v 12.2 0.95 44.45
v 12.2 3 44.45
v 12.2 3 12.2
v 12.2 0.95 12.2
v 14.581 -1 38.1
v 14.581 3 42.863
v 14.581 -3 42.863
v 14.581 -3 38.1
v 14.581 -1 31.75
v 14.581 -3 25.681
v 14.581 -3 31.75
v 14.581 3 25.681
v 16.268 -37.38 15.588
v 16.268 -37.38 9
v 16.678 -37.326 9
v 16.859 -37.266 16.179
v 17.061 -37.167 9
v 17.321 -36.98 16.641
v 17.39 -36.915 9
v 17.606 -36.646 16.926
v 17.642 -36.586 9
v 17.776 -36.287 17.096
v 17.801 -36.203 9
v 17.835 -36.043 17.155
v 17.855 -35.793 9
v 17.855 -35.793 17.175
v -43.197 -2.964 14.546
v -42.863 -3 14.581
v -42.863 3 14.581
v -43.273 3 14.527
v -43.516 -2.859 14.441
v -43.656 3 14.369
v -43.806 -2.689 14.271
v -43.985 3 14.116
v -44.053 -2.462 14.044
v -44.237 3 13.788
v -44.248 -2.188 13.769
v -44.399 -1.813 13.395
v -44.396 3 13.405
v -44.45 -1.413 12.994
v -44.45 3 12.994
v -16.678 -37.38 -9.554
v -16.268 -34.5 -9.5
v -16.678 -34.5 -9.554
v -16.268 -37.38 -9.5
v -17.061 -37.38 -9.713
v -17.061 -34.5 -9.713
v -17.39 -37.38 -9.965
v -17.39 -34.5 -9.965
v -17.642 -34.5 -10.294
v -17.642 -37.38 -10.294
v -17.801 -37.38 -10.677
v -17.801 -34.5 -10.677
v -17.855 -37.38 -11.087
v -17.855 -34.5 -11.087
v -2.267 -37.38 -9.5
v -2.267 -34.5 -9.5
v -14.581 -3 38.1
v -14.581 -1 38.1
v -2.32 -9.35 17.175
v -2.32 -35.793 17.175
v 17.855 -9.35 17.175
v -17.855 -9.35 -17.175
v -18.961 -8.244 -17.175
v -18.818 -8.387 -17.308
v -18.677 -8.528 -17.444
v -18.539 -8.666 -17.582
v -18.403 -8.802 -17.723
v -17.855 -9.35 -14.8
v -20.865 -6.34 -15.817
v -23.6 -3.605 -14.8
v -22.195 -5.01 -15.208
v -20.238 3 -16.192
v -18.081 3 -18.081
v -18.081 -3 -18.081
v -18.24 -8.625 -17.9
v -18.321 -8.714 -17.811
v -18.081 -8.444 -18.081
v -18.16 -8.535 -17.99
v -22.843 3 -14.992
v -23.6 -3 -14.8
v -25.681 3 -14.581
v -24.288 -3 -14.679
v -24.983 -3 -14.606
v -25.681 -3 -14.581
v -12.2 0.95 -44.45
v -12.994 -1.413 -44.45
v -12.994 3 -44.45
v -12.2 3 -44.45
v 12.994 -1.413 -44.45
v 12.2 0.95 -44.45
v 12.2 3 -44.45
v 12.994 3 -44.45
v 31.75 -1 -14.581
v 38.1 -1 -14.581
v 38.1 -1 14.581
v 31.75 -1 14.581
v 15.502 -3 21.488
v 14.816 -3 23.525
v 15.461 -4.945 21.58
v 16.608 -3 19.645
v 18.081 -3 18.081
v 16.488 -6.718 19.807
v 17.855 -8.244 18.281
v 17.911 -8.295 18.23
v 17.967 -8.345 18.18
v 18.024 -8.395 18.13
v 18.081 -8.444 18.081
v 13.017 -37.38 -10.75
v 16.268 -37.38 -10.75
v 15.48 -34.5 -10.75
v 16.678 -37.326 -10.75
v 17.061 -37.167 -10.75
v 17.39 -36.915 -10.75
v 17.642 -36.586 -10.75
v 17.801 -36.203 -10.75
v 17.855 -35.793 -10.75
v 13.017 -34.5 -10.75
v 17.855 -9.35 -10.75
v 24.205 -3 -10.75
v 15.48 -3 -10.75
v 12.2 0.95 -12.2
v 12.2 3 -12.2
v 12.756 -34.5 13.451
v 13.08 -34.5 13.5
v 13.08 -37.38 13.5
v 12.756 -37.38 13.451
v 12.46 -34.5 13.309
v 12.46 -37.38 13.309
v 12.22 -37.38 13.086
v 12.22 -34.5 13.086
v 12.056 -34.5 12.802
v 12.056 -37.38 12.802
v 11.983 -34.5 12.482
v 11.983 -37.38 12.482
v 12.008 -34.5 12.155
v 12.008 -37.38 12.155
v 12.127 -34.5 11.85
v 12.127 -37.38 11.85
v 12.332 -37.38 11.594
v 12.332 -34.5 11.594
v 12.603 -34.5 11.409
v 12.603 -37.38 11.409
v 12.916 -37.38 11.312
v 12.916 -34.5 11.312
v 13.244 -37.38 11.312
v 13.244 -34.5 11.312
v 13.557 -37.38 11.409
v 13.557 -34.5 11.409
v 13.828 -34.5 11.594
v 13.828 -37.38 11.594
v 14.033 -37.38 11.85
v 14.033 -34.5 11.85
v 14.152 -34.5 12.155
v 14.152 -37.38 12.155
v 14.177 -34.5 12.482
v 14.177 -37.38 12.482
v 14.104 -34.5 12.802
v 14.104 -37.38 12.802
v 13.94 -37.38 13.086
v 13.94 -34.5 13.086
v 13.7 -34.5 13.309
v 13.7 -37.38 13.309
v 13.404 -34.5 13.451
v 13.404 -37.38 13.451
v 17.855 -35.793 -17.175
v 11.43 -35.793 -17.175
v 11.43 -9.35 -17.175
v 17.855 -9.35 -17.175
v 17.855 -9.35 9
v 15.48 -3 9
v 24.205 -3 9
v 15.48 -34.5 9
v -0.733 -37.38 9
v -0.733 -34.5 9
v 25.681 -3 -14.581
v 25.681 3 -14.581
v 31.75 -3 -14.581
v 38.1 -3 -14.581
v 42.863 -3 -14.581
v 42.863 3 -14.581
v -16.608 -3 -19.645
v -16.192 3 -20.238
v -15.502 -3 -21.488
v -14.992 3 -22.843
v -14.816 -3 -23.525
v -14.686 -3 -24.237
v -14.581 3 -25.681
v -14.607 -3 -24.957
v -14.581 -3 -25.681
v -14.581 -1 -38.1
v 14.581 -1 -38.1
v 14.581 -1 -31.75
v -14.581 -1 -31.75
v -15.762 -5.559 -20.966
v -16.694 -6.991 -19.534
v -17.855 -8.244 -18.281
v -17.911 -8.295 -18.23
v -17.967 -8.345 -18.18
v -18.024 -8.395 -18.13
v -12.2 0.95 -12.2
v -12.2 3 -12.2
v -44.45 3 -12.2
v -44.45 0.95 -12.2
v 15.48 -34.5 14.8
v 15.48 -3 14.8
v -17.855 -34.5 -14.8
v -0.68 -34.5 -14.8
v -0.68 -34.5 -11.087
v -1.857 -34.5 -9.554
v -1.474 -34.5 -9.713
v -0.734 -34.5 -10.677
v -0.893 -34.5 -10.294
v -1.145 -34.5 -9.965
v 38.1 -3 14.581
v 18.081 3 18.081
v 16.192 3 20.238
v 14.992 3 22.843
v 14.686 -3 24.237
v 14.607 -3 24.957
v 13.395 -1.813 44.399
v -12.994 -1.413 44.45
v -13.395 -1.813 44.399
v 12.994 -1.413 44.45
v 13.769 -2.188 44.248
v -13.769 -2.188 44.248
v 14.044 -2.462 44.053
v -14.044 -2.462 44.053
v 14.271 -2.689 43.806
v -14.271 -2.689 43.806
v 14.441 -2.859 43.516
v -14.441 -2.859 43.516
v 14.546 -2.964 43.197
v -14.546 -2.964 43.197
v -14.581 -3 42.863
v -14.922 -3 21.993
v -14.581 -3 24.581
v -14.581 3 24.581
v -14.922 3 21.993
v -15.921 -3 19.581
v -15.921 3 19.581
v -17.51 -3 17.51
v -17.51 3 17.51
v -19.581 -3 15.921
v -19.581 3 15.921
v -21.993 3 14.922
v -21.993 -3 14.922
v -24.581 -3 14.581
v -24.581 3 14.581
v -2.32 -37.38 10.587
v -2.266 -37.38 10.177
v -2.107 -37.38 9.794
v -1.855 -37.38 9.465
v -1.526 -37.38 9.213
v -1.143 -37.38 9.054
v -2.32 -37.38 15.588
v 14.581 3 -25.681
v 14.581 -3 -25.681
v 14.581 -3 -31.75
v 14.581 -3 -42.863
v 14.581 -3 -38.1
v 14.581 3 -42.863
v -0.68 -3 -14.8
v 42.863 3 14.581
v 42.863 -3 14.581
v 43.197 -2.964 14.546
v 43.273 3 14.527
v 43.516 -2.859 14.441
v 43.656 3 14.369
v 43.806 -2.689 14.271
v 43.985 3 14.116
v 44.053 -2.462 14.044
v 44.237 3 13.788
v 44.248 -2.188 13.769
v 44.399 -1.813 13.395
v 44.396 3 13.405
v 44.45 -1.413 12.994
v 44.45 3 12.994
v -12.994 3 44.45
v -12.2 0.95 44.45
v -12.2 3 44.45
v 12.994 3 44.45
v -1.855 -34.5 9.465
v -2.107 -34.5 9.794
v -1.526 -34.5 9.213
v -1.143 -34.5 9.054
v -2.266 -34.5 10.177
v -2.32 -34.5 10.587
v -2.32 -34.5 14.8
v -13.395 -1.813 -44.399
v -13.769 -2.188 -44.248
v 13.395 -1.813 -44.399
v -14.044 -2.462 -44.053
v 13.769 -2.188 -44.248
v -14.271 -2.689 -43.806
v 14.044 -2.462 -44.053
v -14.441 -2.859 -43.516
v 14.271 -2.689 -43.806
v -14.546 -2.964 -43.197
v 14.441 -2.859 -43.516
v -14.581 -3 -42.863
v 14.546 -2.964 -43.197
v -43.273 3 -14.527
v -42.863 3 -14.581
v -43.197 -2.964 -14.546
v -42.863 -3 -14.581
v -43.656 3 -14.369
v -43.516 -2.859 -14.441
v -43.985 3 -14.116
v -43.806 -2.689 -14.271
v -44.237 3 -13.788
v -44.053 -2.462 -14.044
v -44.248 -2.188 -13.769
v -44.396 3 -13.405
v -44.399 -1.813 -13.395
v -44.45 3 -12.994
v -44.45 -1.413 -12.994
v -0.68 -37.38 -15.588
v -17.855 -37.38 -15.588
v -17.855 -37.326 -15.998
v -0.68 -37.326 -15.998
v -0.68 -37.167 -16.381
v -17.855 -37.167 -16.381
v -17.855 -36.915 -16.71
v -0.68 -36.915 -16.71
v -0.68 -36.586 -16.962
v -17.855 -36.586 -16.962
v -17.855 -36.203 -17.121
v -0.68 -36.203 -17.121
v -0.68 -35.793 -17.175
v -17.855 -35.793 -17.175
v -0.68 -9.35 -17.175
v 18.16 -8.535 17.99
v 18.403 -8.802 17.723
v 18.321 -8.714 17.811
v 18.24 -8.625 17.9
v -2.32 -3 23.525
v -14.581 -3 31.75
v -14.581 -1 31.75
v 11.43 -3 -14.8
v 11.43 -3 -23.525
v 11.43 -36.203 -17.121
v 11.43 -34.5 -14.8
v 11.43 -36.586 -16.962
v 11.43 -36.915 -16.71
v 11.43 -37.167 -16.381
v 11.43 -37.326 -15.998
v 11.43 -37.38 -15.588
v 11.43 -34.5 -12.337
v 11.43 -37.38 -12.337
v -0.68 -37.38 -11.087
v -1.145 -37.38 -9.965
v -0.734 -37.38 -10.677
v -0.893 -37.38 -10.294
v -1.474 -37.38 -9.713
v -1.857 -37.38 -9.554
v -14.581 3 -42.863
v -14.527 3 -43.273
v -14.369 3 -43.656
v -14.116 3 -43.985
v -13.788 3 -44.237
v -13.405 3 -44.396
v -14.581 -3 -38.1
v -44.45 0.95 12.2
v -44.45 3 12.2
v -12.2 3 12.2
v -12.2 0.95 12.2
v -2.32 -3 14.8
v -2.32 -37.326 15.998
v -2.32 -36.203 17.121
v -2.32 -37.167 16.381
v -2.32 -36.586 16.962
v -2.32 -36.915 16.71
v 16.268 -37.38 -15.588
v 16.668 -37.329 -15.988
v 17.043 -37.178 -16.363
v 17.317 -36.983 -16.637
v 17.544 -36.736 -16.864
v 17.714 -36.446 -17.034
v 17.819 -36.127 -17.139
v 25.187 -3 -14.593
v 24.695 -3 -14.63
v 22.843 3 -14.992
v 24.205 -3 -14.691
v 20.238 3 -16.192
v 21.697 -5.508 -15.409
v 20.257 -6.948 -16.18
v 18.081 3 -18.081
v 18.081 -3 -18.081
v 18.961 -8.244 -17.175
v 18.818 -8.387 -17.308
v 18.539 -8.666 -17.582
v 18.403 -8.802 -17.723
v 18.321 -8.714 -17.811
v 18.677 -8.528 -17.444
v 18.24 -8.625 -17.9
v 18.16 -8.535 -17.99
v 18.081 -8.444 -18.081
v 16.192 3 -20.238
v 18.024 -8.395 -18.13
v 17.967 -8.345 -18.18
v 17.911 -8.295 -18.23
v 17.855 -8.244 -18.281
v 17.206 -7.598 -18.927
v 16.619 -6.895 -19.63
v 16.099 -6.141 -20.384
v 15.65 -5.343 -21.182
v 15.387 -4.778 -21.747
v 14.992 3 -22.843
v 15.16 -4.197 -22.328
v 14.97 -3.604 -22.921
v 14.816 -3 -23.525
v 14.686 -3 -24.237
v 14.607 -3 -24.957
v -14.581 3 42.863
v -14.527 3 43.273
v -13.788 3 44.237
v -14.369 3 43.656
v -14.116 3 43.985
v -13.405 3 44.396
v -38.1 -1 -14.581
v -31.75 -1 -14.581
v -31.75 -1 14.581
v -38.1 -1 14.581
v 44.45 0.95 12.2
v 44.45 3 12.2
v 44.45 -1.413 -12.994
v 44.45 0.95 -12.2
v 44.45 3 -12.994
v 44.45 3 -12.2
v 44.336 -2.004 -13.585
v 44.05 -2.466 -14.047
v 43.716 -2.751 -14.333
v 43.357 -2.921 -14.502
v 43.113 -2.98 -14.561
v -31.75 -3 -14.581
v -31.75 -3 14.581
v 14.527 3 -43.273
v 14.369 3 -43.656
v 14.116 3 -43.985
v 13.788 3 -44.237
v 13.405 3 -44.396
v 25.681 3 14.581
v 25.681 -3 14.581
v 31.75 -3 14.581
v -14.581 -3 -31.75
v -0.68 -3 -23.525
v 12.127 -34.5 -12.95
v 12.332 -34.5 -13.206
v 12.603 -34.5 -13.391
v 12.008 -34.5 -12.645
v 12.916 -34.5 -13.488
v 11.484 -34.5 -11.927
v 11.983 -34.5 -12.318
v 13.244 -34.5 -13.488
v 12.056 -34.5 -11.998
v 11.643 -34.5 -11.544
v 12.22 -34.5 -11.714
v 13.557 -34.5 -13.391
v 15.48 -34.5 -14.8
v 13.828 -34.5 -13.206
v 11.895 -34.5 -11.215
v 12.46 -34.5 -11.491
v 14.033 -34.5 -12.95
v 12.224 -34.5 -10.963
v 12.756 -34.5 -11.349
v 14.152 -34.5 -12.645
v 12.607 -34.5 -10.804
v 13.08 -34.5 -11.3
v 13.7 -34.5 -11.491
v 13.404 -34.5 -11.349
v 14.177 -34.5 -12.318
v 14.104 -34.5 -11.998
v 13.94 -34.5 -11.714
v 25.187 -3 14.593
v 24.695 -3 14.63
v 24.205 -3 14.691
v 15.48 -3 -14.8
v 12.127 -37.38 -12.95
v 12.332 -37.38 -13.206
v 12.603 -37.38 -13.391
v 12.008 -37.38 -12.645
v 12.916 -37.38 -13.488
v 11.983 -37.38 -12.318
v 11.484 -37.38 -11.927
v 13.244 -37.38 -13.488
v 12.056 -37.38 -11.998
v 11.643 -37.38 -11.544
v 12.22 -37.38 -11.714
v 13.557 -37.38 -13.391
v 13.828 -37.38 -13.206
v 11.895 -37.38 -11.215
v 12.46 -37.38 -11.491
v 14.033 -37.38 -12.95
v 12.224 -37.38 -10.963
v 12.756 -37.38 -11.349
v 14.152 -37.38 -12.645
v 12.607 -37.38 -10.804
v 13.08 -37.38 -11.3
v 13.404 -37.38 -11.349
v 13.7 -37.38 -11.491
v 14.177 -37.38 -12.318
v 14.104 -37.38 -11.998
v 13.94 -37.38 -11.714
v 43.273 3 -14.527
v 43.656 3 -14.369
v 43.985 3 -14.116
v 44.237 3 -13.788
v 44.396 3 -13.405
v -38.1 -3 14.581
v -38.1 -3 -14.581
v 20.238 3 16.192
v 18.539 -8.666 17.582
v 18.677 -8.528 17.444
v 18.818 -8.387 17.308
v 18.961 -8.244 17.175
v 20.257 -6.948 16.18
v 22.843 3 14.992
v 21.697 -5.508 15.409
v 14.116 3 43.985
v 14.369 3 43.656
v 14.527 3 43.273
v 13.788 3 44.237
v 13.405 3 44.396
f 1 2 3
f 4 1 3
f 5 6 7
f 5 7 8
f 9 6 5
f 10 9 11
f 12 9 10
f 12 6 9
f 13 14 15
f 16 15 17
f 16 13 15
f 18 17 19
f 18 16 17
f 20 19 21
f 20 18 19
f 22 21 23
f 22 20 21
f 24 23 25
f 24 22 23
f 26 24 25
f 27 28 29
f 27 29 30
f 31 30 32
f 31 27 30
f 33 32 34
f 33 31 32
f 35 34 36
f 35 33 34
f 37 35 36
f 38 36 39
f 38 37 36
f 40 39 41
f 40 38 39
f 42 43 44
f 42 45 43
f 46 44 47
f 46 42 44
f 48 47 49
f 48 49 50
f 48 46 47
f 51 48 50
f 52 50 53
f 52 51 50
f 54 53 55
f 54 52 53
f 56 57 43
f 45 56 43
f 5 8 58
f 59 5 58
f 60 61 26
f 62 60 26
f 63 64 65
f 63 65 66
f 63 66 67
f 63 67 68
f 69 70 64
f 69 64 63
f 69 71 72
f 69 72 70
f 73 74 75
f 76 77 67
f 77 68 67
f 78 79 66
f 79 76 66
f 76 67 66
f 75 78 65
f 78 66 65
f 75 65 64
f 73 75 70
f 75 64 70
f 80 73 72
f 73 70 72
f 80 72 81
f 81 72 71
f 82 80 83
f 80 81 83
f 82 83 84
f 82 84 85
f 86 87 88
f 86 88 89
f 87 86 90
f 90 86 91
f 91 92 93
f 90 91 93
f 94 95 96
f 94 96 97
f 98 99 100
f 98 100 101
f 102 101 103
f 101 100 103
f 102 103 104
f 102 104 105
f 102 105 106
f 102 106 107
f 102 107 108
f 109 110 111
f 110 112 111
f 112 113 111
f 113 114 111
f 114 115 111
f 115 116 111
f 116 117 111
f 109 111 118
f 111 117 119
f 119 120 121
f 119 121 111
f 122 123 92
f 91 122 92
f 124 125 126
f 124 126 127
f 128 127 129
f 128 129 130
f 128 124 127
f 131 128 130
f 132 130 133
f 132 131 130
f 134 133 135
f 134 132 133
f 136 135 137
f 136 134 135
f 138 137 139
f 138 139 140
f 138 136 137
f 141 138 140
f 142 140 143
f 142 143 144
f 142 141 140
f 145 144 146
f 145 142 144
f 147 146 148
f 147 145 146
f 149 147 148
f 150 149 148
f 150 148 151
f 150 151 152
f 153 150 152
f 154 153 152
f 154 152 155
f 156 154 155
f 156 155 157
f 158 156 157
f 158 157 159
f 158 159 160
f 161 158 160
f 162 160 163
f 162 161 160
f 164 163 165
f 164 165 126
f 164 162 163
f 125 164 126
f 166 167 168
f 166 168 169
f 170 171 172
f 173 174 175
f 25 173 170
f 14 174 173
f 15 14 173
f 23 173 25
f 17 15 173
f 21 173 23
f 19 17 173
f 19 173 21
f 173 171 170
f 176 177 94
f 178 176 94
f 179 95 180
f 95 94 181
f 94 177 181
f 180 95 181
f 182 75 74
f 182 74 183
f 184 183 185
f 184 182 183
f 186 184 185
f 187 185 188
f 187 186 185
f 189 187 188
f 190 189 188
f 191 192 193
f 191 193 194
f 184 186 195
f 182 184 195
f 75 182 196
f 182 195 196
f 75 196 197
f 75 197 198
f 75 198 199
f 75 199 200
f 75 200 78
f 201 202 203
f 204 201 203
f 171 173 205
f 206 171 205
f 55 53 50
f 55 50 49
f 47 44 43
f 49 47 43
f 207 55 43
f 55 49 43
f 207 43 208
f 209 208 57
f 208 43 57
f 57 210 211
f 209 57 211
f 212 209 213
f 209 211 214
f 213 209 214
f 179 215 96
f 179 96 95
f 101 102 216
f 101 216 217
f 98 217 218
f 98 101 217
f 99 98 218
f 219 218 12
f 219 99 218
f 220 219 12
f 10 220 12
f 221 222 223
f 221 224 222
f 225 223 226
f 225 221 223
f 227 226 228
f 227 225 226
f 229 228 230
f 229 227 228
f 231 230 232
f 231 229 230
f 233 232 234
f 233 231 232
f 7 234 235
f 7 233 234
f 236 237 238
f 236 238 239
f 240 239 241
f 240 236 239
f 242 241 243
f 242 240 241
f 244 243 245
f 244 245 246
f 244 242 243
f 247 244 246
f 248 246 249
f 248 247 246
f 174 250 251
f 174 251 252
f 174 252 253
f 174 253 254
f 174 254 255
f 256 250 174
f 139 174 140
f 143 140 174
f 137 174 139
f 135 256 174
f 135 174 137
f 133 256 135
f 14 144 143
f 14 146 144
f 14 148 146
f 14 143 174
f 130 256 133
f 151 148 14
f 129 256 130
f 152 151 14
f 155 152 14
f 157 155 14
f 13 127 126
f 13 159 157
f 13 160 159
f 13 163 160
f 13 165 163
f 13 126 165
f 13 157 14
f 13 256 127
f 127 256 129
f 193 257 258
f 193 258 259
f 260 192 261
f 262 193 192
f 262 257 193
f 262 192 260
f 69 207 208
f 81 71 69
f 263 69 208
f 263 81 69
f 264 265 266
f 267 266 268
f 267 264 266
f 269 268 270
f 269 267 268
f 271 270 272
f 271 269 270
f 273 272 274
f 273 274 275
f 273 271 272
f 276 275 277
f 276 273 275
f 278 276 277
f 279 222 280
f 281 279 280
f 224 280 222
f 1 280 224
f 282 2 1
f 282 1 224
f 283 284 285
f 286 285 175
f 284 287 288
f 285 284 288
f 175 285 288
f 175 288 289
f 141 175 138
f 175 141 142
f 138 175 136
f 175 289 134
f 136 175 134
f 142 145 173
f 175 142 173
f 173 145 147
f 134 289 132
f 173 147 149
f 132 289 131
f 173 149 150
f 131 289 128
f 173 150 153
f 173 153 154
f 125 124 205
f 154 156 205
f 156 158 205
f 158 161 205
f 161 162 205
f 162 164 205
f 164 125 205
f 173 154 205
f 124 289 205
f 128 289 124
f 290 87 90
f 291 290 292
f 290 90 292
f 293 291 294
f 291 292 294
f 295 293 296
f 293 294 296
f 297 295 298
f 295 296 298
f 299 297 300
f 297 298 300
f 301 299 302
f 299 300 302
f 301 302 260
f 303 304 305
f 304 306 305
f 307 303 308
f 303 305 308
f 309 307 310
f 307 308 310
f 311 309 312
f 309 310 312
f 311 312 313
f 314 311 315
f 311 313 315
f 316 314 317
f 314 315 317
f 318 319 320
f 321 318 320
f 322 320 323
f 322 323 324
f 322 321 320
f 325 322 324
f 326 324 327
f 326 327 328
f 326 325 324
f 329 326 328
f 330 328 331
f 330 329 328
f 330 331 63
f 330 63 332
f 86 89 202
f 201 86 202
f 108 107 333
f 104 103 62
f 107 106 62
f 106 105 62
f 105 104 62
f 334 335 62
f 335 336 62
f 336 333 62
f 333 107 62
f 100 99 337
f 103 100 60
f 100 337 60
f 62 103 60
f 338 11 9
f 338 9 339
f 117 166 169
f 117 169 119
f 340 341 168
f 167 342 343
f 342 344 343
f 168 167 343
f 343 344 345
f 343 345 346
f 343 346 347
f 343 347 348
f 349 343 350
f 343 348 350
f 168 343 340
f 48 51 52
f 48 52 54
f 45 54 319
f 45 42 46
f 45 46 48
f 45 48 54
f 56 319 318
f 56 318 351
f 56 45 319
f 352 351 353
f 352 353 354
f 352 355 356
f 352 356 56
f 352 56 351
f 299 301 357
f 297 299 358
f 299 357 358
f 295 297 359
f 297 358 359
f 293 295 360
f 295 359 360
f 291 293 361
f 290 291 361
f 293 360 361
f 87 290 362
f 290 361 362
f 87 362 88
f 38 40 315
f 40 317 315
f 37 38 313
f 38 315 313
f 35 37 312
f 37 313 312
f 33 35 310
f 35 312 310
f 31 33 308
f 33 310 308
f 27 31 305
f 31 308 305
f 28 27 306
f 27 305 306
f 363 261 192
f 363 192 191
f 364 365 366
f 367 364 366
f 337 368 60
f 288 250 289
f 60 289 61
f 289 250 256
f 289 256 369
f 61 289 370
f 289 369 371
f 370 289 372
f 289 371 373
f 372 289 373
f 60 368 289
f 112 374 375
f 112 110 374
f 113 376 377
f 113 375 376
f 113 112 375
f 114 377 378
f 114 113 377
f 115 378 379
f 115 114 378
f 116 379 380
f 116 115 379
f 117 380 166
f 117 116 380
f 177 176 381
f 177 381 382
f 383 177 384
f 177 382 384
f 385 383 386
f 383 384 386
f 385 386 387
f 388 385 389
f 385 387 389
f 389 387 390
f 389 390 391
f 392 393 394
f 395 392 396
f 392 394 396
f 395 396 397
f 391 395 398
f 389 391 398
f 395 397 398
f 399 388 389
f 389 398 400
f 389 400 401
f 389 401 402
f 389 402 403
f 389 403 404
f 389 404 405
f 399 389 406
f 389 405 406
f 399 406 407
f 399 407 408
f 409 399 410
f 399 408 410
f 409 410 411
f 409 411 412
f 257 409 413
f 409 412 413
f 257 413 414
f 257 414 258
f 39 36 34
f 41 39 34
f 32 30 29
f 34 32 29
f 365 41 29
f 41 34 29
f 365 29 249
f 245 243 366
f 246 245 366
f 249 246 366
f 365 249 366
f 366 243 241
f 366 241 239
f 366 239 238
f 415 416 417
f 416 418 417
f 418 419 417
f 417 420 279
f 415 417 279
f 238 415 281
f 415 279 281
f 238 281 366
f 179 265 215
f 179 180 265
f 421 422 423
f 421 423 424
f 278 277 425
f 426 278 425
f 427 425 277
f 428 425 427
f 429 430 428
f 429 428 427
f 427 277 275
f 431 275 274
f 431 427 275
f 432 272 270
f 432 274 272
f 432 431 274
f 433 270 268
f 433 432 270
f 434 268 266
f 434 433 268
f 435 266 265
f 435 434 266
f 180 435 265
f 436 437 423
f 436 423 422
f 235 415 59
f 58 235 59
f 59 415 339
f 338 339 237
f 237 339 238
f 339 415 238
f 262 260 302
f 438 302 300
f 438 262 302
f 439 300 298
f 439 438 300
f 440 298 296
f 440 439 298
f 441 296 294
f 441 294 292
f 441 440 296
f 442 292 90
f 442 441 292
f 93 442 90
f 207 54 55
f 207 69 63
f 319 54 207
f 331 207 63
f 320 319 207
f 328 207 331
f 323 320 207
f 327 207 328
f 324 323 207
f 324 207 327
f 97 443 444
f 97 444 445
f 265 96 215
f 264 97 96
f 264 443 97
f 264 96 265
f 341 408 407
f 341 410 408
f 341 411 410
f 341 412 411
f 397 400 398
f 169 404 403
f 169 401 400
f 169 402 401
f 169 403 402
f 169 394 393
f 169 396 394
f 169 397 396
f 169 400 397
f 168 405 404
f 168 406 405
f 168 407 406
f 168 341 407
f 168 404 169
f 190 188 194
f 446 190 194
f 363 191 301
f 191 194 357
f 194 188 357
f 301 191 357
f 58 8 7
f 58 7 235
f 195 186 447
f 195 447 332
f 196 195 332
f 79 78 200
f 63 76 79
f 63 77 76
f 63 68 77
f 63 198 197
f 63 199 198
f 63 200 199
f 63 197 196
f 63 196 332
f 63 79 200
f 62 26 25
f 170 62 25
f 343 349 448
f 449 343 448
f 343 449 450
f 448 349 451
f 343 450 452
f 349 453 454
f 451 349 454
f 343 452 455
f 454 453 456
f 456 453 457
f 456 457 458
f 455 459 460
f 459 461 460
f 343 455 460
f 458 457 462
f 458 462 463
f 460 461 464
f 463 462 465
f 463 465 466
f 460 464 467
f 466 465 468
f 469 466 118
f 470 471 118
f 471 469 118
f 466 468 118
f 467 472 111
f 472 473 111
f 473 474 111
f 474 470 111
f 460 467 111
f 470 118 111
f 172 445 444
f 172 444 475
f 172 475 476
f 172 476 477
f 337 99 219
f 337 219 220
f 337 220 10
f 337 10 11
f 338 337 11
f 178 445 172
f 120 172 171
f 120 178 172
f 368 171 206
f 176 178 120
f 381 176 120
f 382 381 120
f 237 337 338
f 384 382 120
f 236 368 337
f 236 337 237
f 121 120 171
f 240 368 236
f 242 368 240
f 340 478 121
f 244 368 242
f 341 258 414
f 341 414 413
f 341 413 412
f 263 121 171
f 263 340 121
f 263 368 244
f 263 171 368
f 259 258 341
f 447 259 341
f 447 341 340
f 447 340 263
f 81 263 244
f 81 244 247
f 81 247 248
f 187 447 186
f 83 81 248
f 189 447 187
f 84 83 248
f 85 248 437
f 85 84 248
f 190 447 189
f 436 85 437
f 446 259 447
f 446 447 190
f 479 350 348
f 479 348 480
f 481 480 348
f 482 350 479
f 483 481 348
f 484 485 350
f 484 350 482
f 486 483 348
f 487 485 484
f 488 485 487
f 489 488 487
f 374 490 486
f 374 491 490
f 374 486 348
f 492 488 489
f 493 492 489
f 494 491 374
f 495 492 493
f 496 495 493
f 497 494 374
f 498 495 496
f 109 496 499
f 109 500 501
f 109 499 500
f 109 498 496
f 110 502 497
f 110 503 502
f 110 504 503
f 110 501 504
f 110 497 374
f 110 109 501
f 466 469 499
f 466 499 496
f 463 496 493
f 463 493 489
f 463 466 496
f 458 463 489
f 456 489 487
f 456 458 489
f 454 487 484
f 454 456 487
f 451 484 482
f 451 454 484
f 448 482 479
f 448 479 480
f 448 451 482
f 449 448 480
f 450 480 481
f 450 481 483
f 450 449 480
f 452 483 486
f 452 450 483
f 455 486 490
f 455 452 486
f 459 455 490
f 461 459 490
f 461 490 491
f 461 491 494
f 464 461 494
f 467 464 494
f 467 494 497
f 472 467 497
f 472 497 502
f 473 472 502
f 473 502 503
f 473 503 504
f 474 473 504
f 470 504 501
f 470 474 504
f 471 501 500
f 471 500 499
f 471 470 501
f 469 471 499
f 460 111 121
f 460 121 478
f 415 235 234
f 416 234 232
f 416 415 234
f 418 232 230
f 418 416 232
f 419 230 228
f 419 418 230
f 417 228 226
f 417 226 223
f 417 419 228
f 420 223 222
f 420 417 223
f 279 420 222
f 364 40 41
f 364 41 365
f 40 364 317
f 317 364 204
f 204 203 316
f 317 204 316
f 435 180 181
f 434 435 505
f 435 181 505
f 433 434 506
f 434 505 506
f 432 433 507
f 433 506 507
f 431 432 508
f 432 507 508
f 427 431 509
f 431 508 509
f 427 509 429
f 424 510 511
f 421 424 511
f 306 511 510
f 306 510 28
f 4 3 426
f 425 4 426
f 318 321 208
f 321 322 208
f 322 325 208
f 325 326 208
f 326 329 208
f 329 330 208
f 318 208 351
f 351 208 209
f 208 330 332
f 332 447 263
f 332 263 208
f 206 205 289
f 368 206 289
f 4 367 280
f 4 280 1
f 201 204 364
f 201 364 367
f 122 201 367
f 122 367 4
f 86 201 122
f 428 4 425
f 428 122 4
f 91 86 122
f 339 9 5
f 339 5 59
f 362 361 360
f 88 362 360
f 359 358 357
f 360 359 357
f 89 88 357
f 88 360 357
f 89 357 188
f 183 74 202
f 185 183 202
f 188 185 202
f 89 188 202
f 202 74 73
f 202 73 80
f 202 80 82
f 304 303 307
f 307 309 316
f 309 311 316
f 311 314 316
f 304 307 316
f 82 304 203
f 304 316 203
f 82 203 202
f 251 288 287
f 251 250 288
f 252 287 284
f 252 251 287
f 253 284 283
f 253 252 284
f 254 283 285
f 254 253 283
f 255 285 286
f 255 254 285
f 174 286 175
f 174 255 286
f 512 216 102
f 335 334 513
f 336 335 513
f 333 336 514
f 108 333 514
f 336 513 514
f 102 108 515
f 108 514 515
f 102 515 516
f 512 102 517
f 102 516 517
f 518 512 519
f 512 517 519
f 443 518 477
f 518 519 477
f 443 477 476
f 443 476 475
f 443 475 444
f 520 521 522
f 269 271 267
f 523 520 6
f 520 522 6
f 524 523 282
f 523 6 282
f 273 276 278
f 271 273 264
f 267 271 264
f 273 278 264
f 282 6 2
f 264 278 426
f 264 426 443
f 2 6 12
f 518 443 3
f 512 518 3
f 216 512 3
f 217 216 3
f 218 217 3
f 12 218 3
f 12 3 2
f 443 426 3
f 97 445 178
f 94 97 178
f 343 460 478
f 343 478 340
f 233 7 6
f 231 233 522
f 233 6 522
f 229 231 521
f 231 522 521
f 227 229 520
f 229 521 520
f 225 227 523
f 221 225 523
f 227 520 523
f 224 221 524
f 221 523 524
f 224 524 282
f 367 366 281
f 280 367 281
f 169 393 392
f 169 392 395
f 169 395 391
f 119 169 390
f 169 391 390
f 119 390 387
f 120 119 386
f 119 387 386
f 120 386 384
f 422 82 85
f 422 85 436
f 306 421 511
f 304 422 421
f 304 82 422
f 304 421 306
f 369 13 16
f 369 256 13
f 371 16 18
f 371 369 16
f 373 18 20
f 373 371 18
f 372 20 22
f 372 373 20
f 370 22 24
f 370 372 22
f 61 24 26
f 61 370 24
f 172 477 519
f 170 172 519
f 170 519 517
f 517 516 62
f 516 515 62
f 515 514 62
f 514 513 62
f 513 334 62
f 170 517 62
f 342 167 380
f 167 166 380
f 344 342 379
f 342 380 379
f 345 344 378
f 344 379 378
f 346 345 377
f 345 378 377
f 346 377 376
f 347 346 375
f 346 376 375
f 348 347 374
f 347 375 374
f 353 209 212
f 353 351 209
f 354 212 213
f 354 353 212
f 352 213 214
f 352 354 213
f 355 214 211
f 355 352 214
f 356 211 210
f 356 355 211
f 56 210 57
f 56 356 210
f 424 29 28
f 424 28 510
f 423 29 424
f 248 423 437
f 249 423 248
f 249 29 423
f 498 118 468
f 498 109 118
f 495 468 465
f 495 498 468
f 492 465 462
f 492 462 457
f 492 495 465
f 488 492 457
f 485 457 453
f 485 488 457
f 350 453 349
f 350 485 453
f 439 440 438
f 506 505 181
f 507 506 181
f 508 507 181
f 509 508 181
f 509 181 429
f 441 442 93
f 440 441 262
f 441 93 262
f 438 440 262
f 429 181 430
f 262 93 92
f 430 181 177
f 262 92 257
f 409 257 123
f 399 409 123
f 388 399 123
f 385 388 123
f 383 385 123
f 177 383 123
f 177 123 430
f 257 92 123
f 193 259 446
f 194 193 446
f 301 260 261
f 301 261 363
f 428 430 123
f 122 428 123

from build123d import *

# Parameters (mm, degrees)
SKETCH1_W           = 29.1625
SKETCH1_H           = 29.86875
SKETCH1_W_2         = 29.86875
SKETCH1_H_2         = 29.1625
BOSS_EXTRUDE1_DEPTH = 3
CUT_EXTRUDE1_DEPTH  = 2.05000004
SKETCH3_W           = 14
SKETCH3_H           = 4.5
SKETCH3_W_2         = 3.25
SKETCH3_H_2         = 3.25
SKETCH3_R           = 1.1
SKETCH3_W_3         = 17
SKETCH3_H_3         = 5
BOSS_EXTRUDE2_DEPTH = 2.88
SKETCH6_W           = 3.500000112
SKETCH6_H           = 3.500000112
BOSS_EXTRUDE3_DEPTH = 6
SKETCH4_W           = 17.175
SKETCH4_H           = 2.375
BOSS_EXTRUDE4_DEPTH = 31.5
FILLET1_R           = 10
CHAMFER1_SIZE       = 6.35
FILLET2_R           = 1.5875
FILLET3_R           = 1.5875
SKETCH7_W           = 29.1625
SKETCH7_H           = 6.35
SKETCH7_W_2         = 6.35
SKETCH7_H_2         = 29.1625
CUT_EXTRUDE2_DEPTH  = 2
FILLET4_R           = 1.5875


with BuildPart() as part:
    # Sketch1 → Boss-Extrude1 (new, symmetric)
    with BuildSketch(Plane(origin=(0, 0, 0), x_dir=(1, 0, 0), z_dir=(0, 1, 0))):
        with Locations((0, -29.515625)):
            Rectangle(SKETCH1_W, SKETCH1_H)
        with Locations((-29.515625, 0)):
            Rectangle(SKETCH1_W_2, SKETCH1_H_2)
        Rectangle(SKETCH1_W, SKETCH1_H_2)
        with Locations((0, 29.515625)):
            Rectangle(SKETCH1_W, SKETCH1_H)
        with Locations((29.515625, 0)):
            Rectangle(SKETCH1_W_2, SKETCH1_H_2)
    extrude(amount=BOSS_EXTRUDE1_DEPTH, both=True)

    # Sketch2 → Cut-Extrude1 (cut)
    with BuildSketch(Plane(origin=(0, 3, 0), x_dir=(1, 0, 0), z_dir=(0, 1, 0))):
        Polygon((12.2, -44.45), (12.2, -12.2), (44.45, -12.2), (44.45, 12.2), (12.2, 12.2), (12.2, 44.45), (-12.2, 44.45), (-12.2, 12.2), (-44.45, 12.2), (-44.45, -12.2), (-12.2, -12.2), (-12.2, -44.45), align=None)
    extrude(amount=-CUT_EXTRUDE1_DEPTH, mode=Mode.SUBTRACT)

    # Sketch6 → Boss-Extrude3 (add)
    with BuildSketch(Plane(origin=(0, -3, 0), x_dir=(-1, 0, 0), z_dir=(0, -1, 0))):
        with Locations((-16.331250056, -16.331250056)):
            Rectangle(SKETCH6_W, SKETCH6_H)
        with Locations((-16.331250056, 16.331250056)):
            Rectangle(SKETCH6_W, SKETCH6_H)
        with Locations((16.331250056, 16.331250056)):
            Rectangle(SKETCH6_W, SKETCH6_H)
    extrude(amount=-BOSS_EXTRUDE3_DEPTH)



with BuildPart() as body_2:
    # Sketch3 → Boss-Extrude2 (new body)
    # profile 1 of 6: a face of its own
    with BuildSketch(Plane.XZ.offset(34.5)):
        Polygon((-17.855, -9.5), (-17.855, -17.175), (-0.68, -17.175), (-0.68, -14), (-14.68, -14), (-14.68, -9.5), align=None)
    # profile 2 of 6: a face of its own
    with BuildSketch(Plane.XZ.offset(34.5)):
        with Locations((-7.68, -11.75)):
            Rectangle(SKETCH3_W, SKETCH3_H)
    # profile 3 of 6: a face of its own
    with BuildSketch(Plane.XZ.offset(34.5)):
        Polygon((14.68, -14), (11.43, -14), (11.43, -17.175), (17.855, -17.175), (17.855, -10.75), (14.68, -10.75), align=None)
    # profile 4 of 6: a face of its own
    with BuildSketch(Plane.XZ.offset(34.5)):
        with Locations((13.055, -12.375)):
            Rectangle(SKETCH3_W_2, SKETCH3_H_2)
        with Locations(Location((13.08, -12.4, 0), (0, 0, 90))):
            Circle(SKETCH3_R, mode=Mode.SUBTRACT)
    # profile 5 of 6: a face of its own
    with BuildSketch(Plane.XZ.offset(34.5)):
        with Locations((6.18, 11.5)):
            Rectangle(SKETCH3_W_3, SKETCH3_H_3)
        with Locations(Location((13.08, 12.4, 0), (0, 0, 90))):
            Circle(SKETCH3_R, mode=Mode.SUBTRACT)
    # profile 6 of 6: a face of its own
    with BuildSketch(Plane.XZ.offset(34.5)):
        Polygon((-2.32, 17.175), (-2.32, 14), (14.68, 14), (14.68, 9), (17.855, 9), (17.855, 17.175), align=None)
    extrude(amount=BOSS_EXTRUDE2_DEPTH)


with BuildPart() as part_1:
    add(part.part)

    add(body_2.part)  # Boss-Extrude4 merges body 2
    # Sketch4 → Boss-Extrude4 (add)
    with BuildSketch(Plane(origin=(0, -34.5, 0), x_dir=(1, 0, 0), z_dir=(0, 1, 0))):
        Polygon((15.48, 10.75), (15.48, 14.8), (11.43, 14.8), (11.43, 17.175), (17.855, 17.175), (17.855, 10.75), align=None)
        Polygon((17.855, -9), (15.48, -9), (15.48, -14.8), (-2.32, -14.8), (-2.32, -17.175), (17.855, -17.175), align=None)
        with Locations((-9.2675, 15.9875)):
            Rectangle(SKETCH4_W, SKETCH4_H)
    extrude(amount=BOSS_EXTRUDE4_DEPTH)

    # Fillet1
    # the kernel refuses this fillet: 10 mm, written as the material it adds along each edge
    with BuildSketch(Plane(origin=(-14.58125, -3, 14.58125), x_dir=(-1, 0, 0), z_dir=(0, 1, 0))) as fillet1_piece_1:
        with BuildLine():
            CenterArc((FILLET1_R, FILLET1_R), FILLET1_R, 180, 90)
            Line((0, FILLET1_R), (-FILLET1_R * 0.02, FILLET1_R))
            Line((-FILLET1_R * 0.02, FILLET1_R), (-FILLET1_R * 0.02, -FILLET1_R * 0.02))
            Line((-FILLET1_R * 0.02, -FILLET1_R * 0.02), (FILLET1_R, -FILLET1_R * 0.02))
            Line((FILLET1_R, -FILLET1_R * 0.02), (FILLET1_R, 0))
        make_face()
    extrude(amount=6)
    with BuildSketch(Plane(origin=(-14.58125, -3, -18.081250112), x_dir=(0, 0, -1), z_dir=(0, 1, 0))) as fillet1_piece_2:
        with BuildLine():
            CenterArc((7.599342173, 10), FILLET1_R, 220.541601029, 49.458398971)
            Line((0, 3.500000112), (-0.151986843, 3.370000114))
            ThreePointArc((-0.151986843, 3.370000114), (-0.2, 1.750000056), (-0.2, 0))
            Line((-0.2, 0), (0, -0.2))
            Line((0, -0.2), (7.599342173, -0.2))
            Line((7.599342173, -0.2), (7.599342173, 0))
        make_face()
    extrude(amount=6)
    with BuildSketch(Plane(origin=(-18.081250112, -3, -14.58125), x_dir=(0, 0, -1), z_dir=(0, 1, 0)), Plane(origin=(14.58125, -3, -18.081250112), x_dir=(1, 0, 0), z_dir=(0, 1, 0))) as fillet1_piece_3:
        with BuildLine():
            CenterArc((10, 7.599342173), FILLET1_R, 180, 49.458398971)
            Line((0, 7.599342173), (-0.2, 7.599342173))
            Line((-0.2, 7.599342173), (-0.2, 0))
            Line((-0.2, 0), (0, -0.2))
            ThreePointArc((0, -0.2), (1.750000056, -0.2), (3.370000114, -0.151986843))
            Line((3.370000114, -0.151986843), (3.500000112, 0))
        make_face()
    extrude(amount=6)
    with BuildSketch(Plane(origin=(18.081250112, -3, -14.58125), x_dir=(0, 0, -1), z_dir=(0, 1, 0)), Plane(origin=(14.58125, -3, 18.081250112), x_dir=(1, 0, 0), z_dir=(0, 1, 0))) as fillet1_piece_4:
        with BuildLine():
            CenterArc((10, -7.599342173), FILLET1_R, 130.541601029, 49.458398971)
            Line((0, -7.599342173), (-0.2, -7.599342173))
            Line((-0.2, -7.599342173), (-0.2, 0))
            Line((-0.2, 0), (0, 0.2))
            ThreePointArc((0, 0.2), (1.750000056, 0.2), (3.370000114, 0.151986843))
            Line((3.370000114, 0.151986843), (3.500000112, 0))
        make_face()
    extrude(amount=6)
    with BuildSketch(Plane(origin=(18.081250112, -3, 14.58125), x_dir=(1, 0, 0), z_dir=(0, 1, 0))) as fillet1_piece_5:
        with BuildLine():
            CenterArc((7.599342173, -10), FILLET1_R, 90, 49.458398971)
            Line((0, -3.500000112), (-0.151986843, -3.370000114))
            ThreePointArc((-0.151986843, -3.370000114), (-0.2, -1.750000056), (-0.2, 0))
            Line((-0.2, 0), (0, 0.2))
            Line((0, 0.2), (7.599342173, 0.2))
            Line((7.599342173, 0.2), (7.599342173, 0))
        make_face()
    extrude(amount=6)

    # Chamfer1
    # the kernel refuses this chamfer: 6.35 mm, written as the material it adds along each edge
    with BuildSketch(Plane(origin=(-2.32, -3, 17.175), x_dir=(0, 0, 1), z_dir=(1, 0, 0))) as chamfer1_piece_1_section:
        Polygon((CHAMFER1_SIZE, 0), (0, CHAMFER1_SIZE), (0, 0), align=None)
    chamfer1_piece_1 = extrude(amount=36.505186974, mode=Mode.PRIVATE)
    chamfer1_piece_1 = chamfer1_piece_1 - Plane(origin=(25.680592285, -3, 24.58125), x_dir=(1, 0, 0), z_dir=(0, -1, 0)) * Cylinder(10, 99, mode=Mode.PRIVATE)
    chamfer1_piece_1 = chamfer1_piece_1 - Plane(origin=(24.58125, -3, 25.680592285), x_dir=(1, 0, 0), z_dir=(0, -1, 0)) * Cylinder(10, 99, mode=Mode.PRIVATE)
    chamfer1_piece_1 = split(chamfer1_piece_1, bisect_by=Plane(origin=(10.9425, -16.2625, 17.175), z_dir=(-0.7071067811865478, 0.7071067811865475, 0)), keep=Keep.TOP, mode=Mode.PRIVATE)
    add(chamfer1_piece_1)
    with BuildSketch(Plane(origin=(17.855, -3, 33.505186974), x_dir=(1, 0, 0), z_dir=(0, 0, -1))) as chamfer1_piece_2_section:
        Polygon((CHAMFER1_SIZE, 0), (0, CHAMFER1_SIZE), (0, 0), align=None)
    chamfer1_piece_2 = extrude(amount=24.505186974, mode=Mode.PRIVATE)
    chamfer1_piece_2 = chamfer1_piece_2 - Plane(origin=(25.680592285, -3, 24.58125), x_dir=(1, 0, 0), z_dir=(0, -1, 0)) * Cylinder(10, 75, mode=Mode.PRIVATE)
    chamfer1_piece_2 = chamfer1_piece_2 - Plane(origin=(24.58125, -3, 25.680592285), x_dir=(1, 0, 0), z_dir=(0, -1, 0)) * Cylinder(10, 75, mode=Mode.PRIVATE)
    chamfer1_piece_2 = split(chamfer1_piece_2, bisect_by=Plane(origin=(17.855, 1.990093487, 28.515093487), z_dir=(0, 0.7071067811865475, -0.7071067811865478)), keep=Keep.TOP, mode=Mode.PRIVATE)
    add(chamfer1_piece_2)
    with BuildSketch(Plane(origin=(-34.185186974, -3, -17.175), x_dir=(0, 0, -1), z_dir=(1, 0, 0))) as chamfer1_piece_3_section:
        Polygon((CHAMFER1_SIZE, 0), (0, -CHAMFER1_SIZE), (0, 0), align=None)
    chamfer1_piece_3 = extrude(amount=33.505186974, mode=Mode.PRIVATE)
    chamfer1_piece_3 = chamfer1_piece_3 - Plane(origin=(-24.58125, -3, -25.680592285), x_dir=(0, 0, -1), z_dir=(0, -1, 0)) * Cylinder(10, 93, mode=Mode.PRIVATE)
    chamfer1_piece_3 = chamfer1_piece_3 - Plane(origin=(-25.680592285, -3, -24.58125), x_dir=(0, 0, -1), z_dir=(0, -1, 0)) * Cylinder(10, 93, mode=Mode.PRIVATE)
    chamfer1_piece_3 = split(chamfer1_piece_3, bisect_by=Plane(origin=(-29.195093487, 1.990093487, -17.175), z_dir=(0.7071067811865476, 0.7071067811865476, 0)), keep=Keep.TOP, mode=Mode.PRIVATE)
    add(chamfer1_piece_3)
    with BuildSketch(Plane(origin=(-34.185186974, -3, -17.175), x_dir=(0, 0, -1), z_dir=(1, 0, 0))) as chamfer1_piece_4_section:
        Polygon((CHAMFER1_SIZE, 0), (0, -CHAMFER1_SIZE), (0, 0), align=None)
    chamfer1_piece_4 = extrude(amount=49.835373947, mode=Mode.PRIVATE)
    chamfer1_piece_4 = chamfer1_piece_4 - Plane(origin=(24.58125, -3, -25.680592285), x_dir=(1, 0, 0), z_dir=(0, -1, 0)) * Cylinder(10, 126, mode=Mode.PRIVATE)
    chamfer1_piece_4 = split(chamfer1_piece_4, bisect_by=Plane(origin=(11.43, -3, -17.175), z_dir=(1, 0, 0)), keep=Keep.TOP, mode=Mode.PRIVATE)
    add(chamfer1_piece_4)
    with BuildSketch(Plane(origin=(-17.855, -3, -14.8), x_dir=(-1, 0, 0), z_dir=(0, 0, -1))) as chamfer1_piece_5_section:
        Polygon((CHAMFER1_SIZE, 0), (0, -CHAMFER1_SIZE), (0, 0), align=None)
    chamfer1_piece_5 = extrude(amount=18.705186974, mode=Mode.PRIVATE)
    chamfer1_piece_5 = chamfer1_piece_5 - Plane(origin=(-24.58125, -3, -25.680592285), x_dir=(0, 0, -1), z_dir=(0, -1, 0)) * Cylinder(10, 63, mode=Mode.PRIVATE)
    chamfer1_piece_5 = chamfer1_piece_5 - Plane(origin=(-25.680592285, -3, -24.58125), x_dir=(0, 0, -1), z_dir=(0, -1, 0)) * Cylinder(10, 63, mode=Mode.PRIVATE)
    chamfer1_piece_5 = split(chamfer1_piece_5, bisect_by=Plane(origin=(-17.855, -7.3625, -19.1625), z_dir=(0, 0.7071067811865475, 0.7071067811865478)), keep=Keep.TOP, mode=Mode.PRIVATE)
    add(chamfer1_piece_5)
    with BuildSketch(Plane(origin=(-4.900186974, -3, -17.175), x_dir=(0, 0, -1), z_dir=(1, 0, 0))) as chamfer1_piece_6_section:
        Polygon((CHAMFER1_SIZE, 0), (0, -CHAMFER1_SIZE), (0, 0), align=None)
    chamfer1_piece_6 = extrude(amount=39.085373947, mode=Mode.PRIVATE)
    chamfer1_piece_6 = split(chamfer1_piece_6, bisect_by=Plane(origin=(-0.68, -3, -17.175), z_dir=(-1, 0, 0)), keep=Keep.TOP, mode=Mode.PRIVATE)
    add(chamfer1_piece_6)
    with BuildSketch(Plane(origin=(11.43, -3, -17.175), x_dir=(0, 0, -1), z_dir=(1, 0, 0))) as chamfer1_piece_7_section:
        Polygon((CHAMFER1_SIZE, 0), (0, -CHAMFER1_SIZE), (0, 0), align=None)
    chamfer1_piece_7 = extrude(amount=22.755186974, mode=Mode.PRIVATE)
    chamfer1_piece_7 = chamfer1_piece_7 - Plane(origin=(24.58125, -3, -25.680592285), x_dir=(1, 0, 0), z_dir=(0, -1, 0)) * Cylinder(10, 71, mode=Mode.PRIVATE)
    chamfer1_piece_7 = chamfer1_piece_7 - Plane(origin=(25.680592285, -3, -24.58125), x_dir=(0, 0, -1), z_dir=(0, -1, 0)) * Cylinder(10, 71, mode=Mode.PRIVATE)
    chamfer1_piece_7 = split(chamfer1_piece_7, bisect_by=Plane(origin=(17.8175, -9.3875, -17.175), z_dir=(-0.7071067811865476, 0.7071067811865476, 0)), keep=Keep.TOP, mode=Mode.PRIVATE)
    add(chamfer1_piece_7)
    with BuildSketch(Plane(origin=(17.855, -3, -33.505186974), x_dir=(1, 0, 0), z_dir=(0, 0, 1))) as chamfer1_piece_8_section:
        Polygon((CHAMFER1_SIZE, 0), (0, -CHAMFER1_SIZE), (0, 0), align=None)
    chamfer1_piece_8 = extrude(amount=22.755186974, mode=Mode.PRIVATE)
    chamfer1_piece_8 = chamfer1_piece_8 - Plane(origin=(24.58125, -3, -25.680592285), x_dir=(1, 0, 0), z_dir=(0, -1, 0)) * Cylinder(10, 71, mode=Mode.PRIVATE)
    chamfer1_piece_8 = chamfer1_piece_8 - Plane(origin=(25.680592285, -3, -24.58125), x_dir=(0, 0, -1), z_dir=(0, -1, 0)) * Cylinder(10, 71, mode=Mode.PRIVATE)
    chamfer1_piece_8 = split(chamfer1_piece_8, bisect_by=Plane(origin=(17.855, 1.990093487, -28.515093487), z_dir=(0, 0.7071067811865475, 0.7071067811865478)), keep=Keep.TOP, mode=Mode.PRIVATE)
    add(chamfer1_piece_8)

    # Fillet2
    fillet2_edges = [part_1.edges().sort_by_distance(p)[0] for p in [
        (-0.68, -35.94, -9.5),
        (-2.32, -35.94, 9),
        (11.43, -35.94, -10.75),
        (-17.855, -35.94, -9.5),
    ]]
    fillet(fillet2_edges, radius=FILLET2_R)

    # Fillet3
    fillet3_edges = [part_1.edges().sort_by_distance(p)[0] for p in [
        (17.855, -37.38, 13.0875),
        (7.7675, -37.38, 17.175),
        (-9.2675, -37.38, -17.175),
        (14.6425, -37.38, -17.175),
        (17.855, -37.38, -13.9625),
    ]]
    fillet(fillet3_edges, radius=FILLET3_R)

    # Sketch7 → Cut-Extrude2 (cut)
    with BuildSketch(Plane(origin=(0, -3, 0), x_dir=(-1, 0, 0), z_dir=(0, -1, 0))):
        with Locations((0, -34.925)):
            Rectangle(SKETCH7_W, SKETCH7_H)
        with Locations((-34.925, 0)):
            Rectangle(SKETCH7_W_2, SKETCH7_H_2)
        with Locations((0, 34.925)):
            Rectangle(SKETCH7_W, SKETCH7_H)
        with Locations((34.925, 0)):
            Rectangle(SKETCH7_W_2, SKETCH7_H_2)
    extrude(amount=-CUT_EXTRUDE2_DEPTH, mode=Mode.SUBTRACT)

    # Fillet4
    fillet4_edges = [part_1.edges().sort_by_distance(p)[0] for p in [
        (14.58125, 0, 44.45),
        (44.45, 0, 14.58125),
        (44.45, -3, 0),
        (44.45, 0, -14.58125),
        (14.58125, 0, -44.45),
        (-14.58125, 0, -44.45),
        (-44.45, 0, -14.58125),
        (-44.45, 0, 14.58125),
        (-14.58125, 0, 44.45),
        (0, -3, 44.45),
        (-44.45, -3, 0),
        (0, -3, -44.45),
    ]]
    fillet(fillet4_edges, radius=FILLET4_R)


solid = part_1.part
